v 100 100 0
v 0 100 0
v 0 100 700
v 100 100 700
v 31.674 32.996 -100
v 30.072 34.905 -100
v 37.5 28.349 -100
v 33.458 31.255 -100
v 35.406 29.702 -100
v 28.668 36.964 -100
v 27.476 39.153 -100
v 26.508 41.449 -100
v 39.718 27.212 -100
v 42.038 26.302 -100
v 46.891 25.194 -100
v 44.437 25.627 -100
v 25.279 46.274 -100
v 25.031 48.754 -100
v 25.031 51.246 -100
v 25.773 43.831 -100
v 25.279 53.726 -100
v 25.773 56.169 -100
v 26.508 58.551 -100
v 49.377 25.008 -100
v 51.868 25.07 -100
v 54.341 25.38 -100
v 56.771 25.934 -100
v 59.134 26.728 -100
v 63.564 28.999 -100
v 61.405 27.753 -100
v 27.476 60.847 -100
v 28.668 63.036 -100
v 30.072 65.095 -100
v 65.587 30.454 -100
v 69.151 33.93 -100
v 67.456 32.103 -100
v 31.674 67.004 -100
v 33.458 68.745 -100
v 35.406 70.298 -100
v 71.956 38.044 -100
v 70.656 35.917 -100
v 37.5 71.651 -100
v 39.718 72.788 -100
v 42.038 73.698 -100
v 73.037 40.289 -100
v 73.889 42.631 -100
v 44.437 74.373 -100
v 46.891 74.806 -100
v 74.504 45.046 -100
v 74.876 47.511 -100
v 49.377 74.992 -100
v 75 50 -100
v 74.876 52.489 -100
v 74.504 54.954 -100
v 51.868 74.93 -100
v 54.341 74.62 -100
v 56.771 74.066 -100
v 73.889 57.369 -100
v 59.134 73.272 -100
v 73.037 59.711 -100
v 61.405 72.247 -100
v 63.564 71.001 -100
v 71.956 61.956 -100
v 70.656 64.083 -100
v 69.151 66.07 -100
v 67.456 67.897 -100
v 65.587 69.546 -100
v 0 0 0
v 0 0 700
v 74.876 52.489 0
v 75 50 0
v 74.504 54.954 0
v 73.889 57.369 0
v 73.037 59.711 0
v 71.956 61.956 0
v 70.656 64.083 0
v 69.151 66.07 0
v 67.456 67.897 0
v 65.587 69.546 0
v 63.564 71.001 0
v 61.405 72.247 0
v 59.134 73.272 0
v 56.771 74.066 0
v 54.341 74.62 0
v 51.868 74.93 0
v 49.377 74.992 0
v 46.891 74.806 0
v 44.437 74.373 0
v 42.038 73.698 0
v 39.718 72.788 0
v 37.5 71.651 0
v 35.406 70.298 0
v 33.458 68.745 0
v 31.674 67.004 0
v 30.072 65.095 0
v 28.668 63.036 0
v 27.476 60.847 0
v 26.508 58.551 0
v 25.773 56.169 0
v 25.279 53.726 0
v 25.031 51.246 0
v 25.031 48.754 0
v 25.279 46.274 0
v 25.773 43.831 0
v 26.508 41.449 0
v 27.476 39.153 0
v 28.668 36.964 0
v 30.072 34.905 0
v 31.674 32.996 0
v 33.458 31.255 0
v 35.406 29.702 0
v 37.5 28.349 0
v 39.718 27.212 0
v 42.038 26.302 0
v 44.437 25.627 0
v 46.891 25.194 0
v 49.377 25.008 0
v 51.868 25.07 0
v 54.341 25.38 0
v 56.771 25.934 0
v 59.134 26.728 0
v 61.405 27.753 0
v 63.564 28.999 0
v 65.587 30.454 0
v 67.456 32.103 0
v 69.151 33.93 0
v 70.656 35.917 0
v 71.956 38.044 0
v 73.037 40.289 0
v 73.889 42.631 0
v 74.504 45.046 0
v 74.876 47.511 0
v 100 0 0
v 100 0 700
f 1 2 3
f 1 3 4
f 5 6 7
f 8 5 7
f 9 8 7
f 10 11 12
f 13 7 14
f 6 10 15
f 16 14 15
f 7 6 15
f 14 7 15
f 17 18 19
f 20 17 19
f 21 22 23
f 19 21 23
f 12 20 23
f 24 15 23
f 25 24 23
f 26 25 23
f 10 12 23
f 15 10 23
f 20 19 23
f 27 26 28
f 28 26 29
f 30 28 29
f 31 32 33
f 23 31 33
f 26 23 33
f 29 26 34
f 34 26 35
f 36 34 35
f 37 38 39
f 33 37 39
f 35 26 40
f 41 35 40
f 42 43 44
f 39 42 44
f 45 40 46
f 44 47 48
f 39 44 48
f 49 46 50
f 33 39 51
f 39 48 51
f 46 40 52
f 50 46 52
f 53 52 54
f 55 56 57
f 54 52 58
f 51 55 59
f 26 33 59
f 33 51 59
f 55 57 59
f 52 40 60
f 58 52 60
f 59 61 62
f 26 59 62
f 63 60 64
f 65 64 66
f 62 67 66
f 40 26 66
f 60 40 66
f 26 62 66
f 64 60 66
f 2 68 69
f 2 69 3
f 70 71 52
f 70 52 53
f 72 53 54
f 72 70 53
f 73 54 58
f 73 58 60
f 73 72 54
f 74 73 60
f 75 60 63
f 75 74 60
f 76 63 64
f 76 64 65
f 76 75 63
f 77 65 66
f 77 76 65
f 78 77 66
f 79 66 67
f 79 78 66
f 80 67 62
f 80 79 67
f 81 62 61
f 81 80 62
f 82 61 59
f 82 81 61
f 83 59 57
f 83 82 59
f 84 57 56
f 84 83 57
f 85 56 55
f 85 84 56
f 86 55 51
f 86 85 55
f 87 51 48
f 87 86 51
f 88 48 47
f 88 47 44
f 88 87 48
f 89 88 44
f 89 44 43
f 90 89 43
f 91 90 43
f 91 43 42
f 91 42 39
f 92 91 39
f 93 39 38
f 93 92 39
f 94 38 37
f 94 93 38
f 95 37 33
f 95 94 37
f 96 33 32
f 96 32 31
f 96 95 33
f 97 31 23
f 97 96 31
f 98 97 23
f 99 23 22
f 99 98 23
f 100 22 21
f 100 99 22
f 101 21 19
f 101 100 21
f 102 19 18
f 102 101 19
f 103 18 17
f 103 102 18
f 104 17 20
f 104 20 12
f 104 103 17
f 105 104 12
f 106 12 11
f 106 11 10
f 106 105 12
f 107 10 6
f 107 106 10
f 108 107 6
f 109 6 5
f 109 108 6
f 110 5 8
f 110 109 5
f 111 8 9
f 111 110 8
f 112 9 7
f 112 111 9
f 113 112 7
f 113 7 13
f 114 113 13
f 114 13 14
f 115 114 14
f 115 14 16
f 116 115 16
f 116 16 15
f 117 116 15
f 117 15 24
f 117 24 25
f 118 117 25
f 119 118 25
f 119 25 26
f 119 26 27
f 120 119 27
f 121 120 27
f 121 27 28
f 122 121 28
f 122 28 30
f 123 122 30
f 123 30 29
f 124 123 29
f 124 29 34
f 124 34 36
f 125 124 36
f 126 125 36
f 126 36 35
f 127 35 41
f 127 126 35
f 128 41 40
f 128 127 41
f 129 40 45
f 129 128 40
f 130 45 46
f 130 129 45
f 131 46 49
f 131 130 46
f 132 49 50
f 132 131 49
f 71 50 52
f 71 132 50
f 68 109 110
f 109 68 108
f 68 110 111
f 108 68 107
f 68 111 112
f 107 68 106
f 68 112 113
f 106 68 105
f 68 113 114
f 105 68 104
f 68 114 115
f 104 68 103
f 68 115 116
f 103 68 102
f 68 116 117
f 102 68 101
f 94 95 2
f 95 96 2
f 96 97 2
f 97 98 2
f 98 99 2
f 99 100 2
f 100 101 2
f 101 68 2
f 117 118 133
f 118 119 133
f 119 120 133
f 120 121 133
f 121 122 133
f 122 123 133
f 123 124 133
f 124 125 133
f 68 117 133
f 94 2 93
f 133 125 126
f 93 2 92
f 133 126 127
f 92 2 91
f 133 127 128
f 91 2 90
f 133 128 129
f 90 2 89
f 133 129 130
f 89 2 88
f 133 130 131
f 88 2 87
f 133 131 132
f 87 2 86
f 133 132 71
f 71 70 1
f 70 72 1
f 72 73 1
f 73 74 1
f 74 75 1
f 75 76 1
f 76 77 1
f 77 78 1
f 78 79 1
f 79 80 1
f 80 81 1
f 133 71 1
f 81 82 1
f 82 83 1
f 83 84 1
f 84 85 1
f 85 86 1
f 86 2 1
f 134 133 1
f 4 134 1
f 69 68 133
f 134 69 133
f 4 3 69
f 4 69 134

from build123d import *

# Parameters (mm, degrees)
SKETCH1_W           = 100
SKETCH1_H           = 100
BOSS_EXTRUDE1_DEPTH = 700
SKETCH2_R           = 25
BOSS_EXTRUDE2_DEPTH = 100


with BuildPart() as part:
    # Sketch1 → Boss-Extrude1 (new body)
    with BuildSketch(Plane.XY):
        with Locations((50, 50)):
            Rectangle(SKETCH1_W, SKETCH1_H)
    extrude(amount=BOSS_EXTRUDE1_DEPTH)

    # Sketch2 → Boss-Extrude2 (add)
    with BuildSketch(Plane.XY):
        with Locations((50, 50)):
            Circle(SKETCH2_R)
    extrude(amount=-BOSS_EXTRUDE2_DEPTH)


solid = part.part
